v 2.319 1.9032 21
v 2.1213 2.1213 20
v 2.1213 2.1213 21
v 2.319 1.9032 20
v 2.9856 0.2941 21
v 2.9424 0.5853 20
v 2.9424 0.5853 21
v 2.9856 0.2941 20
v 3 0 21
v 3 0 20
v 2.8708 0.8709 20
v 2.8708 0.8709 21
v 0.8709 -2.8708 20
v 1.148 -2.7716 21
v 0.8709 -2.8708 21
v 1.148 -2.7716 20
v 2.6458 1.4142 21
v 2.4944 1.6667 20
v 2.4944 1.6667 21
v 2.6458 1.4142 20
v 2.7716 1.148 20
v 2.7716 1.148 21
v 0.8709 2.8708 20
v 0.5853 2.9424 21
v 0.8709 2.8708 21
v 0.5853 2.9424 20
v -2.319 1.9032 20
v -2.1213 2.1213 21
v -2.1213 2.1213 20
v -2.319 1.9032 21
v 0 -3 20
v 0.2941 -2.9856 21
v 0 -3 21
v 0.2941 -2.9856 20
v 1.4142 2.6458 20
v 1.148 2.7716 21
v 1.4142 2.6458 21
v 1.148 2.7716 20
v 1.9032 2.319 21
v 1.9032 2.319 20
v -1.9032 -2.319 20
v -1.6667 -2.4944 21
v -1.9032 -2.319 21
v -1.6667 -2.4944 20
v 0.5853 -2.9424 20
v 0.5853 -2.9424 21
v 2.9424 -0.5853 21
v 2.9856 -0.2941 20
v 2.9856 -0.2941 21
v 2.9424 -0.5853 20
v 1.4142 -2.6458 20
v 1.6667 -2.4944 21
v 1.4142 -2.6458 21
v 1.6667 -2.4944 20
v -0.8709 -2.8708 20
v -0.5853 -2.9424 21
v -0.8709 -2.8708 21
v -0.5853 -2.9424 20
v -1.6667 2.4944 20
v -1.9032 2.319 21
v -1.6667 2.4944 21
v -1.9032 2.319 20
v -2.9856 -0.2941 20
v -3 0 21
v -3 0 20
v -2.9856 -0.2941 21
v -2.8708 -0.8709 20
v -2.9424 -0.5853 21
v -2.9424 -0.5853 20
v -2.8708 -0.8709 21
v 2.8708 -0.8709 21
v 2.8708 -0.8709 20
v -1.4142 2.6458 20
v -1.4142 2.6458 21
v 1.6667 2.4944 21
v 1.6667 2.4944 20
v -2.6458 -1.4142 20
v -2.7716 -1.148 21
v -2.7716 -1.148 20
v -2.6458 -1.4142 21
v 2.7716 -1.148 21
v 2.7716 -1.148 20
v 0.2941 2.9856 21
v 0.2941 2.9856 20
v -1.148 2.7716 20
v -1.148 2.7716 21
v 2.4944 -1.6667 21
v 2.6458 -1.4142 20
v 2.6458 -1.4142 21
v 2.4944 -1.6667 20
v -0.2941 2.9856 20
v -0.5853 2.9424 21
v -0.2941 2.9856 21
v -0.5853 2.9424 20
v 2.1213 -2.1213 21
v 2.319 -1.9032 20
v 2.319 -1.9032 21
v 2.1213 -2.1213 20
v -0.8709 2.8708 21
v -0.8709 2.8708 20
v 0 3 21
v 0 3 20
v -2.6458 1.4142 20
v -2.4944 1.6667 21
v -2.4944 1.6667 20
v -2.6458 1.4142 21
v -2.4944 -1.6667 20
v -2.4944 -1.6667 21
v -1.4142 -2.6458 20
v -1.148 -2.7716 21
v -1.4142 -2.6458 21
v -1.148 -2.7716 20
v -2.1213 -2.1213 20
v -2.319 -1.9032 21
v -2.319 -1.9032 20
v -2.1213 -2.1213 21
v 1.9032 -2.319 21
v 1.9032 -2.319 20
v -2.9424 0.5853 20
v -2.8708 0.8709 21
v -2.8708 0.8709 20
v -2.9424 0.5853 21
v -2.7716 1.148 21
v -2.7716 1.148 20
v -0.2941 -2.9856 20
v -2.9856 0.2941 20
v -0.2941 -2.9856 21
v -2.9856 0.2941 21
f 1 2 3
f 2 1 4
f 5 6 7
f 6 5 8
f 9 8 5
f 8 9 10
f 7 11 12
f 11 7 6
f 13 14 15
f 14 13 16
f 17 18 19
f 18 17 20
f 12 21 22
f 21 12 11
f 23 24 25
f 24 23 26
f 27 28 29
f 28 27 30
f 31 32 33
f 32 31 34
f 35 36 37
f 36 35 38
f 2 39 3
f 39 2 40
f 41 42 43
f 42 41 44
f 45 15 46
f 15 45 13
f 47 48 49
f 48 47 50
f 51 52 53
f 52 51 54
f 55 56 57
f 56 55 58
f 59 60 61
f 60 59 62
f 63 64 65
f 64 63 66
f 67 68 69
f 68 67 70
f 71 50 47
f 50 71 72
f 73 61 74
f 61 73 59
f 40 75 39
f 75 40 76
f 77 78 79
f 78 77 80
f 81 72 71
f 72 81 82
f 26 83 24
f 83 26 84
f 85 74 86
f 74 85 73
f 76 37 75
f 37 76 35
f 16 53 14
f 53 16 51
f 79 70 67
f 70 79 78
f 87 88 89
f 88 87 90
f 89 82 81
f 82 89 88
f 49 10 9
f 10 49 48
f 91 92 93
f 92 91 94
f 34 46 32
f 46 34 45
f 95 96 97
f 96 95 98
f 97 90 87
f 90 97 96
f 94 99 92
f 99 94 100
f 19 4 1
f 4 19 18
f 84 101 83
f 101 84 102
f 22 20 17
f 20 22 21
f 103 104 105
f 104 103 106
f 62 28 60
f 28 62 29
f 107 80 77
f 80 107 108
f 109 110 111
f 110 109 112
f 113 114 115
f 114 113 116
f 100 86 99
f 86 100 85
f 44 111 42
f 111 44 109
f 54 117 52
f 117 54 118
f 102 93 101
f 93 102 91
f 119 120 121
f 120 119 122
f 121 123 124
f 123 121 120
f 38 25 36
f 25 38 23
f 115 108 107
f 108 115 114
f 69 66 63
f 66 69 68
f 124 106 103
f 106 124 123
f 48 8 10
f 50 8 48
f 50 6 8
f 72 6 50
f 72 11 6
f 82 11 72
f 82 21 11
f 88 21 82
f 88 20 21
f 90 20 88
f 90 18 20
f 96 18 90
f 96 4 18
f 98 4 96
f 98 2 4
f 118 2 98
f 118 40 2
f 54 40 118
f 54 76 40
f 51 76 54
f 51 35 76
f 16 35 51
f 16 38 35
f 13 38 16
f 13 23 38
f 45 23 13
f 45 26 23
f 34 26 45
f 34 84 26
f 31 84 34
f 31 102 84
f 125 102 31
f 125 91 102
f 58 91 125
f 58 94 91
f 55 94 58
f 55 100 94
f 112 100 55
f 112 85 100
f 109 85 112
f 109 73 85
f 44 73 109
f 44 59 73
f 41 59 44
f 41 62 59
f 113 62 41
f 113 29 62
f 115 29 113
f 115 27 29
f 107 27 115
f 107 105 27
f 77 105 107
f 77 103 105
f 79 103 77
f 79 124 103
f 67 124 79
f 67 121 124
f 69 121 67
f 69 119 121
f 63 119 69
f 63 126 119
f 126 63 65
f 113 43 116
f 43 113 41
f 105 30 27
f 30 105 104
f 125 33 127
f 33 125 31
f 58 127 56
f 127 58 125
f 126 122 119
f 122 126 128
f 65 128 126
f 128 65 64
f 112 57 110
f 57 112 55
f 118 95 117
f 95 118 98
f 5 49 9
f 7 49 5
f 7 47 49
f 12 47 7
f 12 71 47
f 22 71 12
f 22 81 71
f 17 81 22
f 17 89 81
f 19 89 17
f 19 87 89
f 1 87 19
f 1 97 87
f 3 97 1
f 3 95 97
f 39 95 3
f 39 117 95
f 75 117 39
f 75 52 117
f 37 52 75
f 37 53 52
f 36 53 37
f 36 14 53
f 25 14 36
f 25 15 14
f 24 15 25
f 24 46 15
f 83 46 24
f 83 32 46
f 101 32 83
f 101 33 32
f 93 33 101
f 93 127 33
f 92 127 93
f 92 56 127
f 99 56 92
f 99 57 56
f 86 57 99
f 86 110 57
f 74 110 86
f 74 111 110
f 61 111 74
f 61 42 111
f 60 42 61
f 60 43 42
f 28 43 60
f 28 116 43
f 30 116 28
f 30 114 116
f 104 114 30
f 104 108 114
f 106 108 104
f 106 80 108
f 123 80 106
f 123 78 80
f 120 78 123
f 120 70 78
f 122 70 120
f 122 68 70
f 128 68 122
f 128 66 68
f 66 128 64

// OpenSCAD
// Hose-barb reducer: 8 mm tubing (barbs) -> 5 mm tubing (barbs)
// Print orientation: standing upright along Z

$fn = 64;

// ---- Dimensions (mm) ----
barb_od        = 8;    // inner tubing outer diameter
tip_od         = 5;    // tip tubing outer diameter
bore           = 3;    // through-bore diameter
barb_length    = 20;   // barb length (z = 0 to 20)
collar_height  = 5;    // collar height (z = 20 to 25)
lower_barb_len = 8;    // lower barb length (z = 25 to 33)
upper_barb_len = 8;    // upper barb length (z = 33 to 41)
overlap        = 0.5;  // overlap for clean booleans

// ---- Model ----
difference() {
    union() {
        // Lower barb: sawtooth profile, rotated onto Z
        translate([0, 0, 0])
            rotate([90, 0, 0])
                linear_extrude(height = barb_length + overlap)
                    polygon([
                        [0, 0],
                        [lower_barb_len + overlap, lower_barb_len + overlap],
                        [lower_barb_len + overlap, 0],
                        [0, lower_barb_len]
                    ]);

        // Collar
        translate([0, 0, barb_length])
            cylinder(height = collar_height, d = tip_od + 2 * overlap);

        // Upper barb: sawtooth profile, rotated onto Z
        translate([0, 0, barb_length + collar_height])
            rotate([90, 0, 0])
                linear_extrude(height = upper_barb_len + overlap)
                    polygon([
                        [0, 0],
                        [upper_barb_len + overlap, upper_barb_len + overlap],
                        [upper_barb_len + overlap, 0],
                        [0, upper_barb_len]
                    ]);
    }

    // Through-bore
    translate([0, 0, -overlap])
        cylinder(height = barb_length + collar_height + 2 * overlap, d = bore);
}
